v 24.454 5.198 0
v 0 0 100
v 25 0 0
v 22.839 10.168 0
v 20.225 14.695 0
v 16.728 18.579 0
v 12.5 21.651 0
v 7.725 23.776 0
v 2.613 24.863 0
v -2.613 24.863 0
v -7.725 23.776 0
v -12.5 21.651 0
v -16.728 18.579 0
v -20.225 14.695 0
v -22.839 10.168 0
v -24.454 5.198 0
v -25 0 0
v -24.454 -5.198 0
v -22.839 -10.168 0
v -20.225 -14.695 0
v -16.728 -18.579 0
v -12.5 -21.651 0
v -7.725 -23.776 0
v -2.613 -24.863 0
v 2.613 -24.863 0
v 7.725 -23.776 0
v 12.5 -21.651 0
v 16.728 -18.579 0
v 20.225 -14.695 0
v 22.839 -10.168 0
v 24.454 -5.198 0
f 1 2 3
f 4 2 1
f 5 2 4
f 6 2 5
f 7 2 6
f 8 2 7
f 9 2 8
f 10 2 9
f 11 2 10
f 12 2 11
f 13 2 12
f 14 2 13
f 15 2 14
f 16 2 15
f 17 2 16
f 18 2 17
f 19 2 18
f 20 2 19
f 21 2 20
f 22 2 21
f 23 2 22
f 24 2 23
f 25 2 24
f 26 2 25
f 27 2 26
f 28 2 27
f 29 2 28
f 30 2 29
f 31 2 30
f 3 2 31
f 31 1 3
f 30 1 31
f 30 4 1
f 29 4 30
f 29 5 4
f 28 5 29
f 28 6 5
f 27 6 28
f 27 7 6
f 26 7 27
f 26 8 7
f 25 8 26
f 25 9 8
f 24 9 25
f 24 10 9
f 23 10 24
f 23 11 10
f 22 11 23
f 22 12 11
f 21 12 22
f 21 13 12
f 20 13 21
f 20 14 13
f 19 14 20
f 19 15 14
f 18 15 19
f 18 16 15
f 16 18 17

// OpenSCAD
// Generated by SolidPython 1.1.3 on 2024-12-13 22:55:15


cylinder(h = 100, r1 = 25.0000000000, r2 = 0);
/***********************************************
*********      SolidPython code:      **********
************************************************
 
import cv2
import os
from solid import cube, cylinder, scad_render_to_file, polyhedron


# Function to detect shape
def detect_shape(view, view_name):
    if view is None:
        raise ValueError(f"{view_name} image could not be loaded. Check the file path.")

    gray_image = cv2.cvtColor(view, cv2.COLOR_BGR2GRAY)
    _, thresh_image = cv2.threshold(gray_image, 220, 255, cv2.THRESH_BINARY)
    contours, _ = cv2.findContours(thresh_image, cv2.RETR_TREE, cv2.CHAIN_APPROX_SIMPLE)

    for i, contour in enumerate(contours):
        if i == 0:
            continue  # Skip the outermost contour

        epsilon = 0.01 * cv2.arcLength(contour, True)
        approx = cv2.approxPolyDP(contour, epsilon, True)

        if len(approx) == 3:
            return "Triangle"
        elif len(approx) == 4:
            (x, y, w, h) = cv2.boundingRect(approx)
            aspect_ratio = w / float(h)
            if 0.95 <= aspect_ratio <= 1.05:
                return "Square"
            else:
                return "Rectangle"
        elif len(approx) == 5:
            return "Pentagon"
        elif len(approx) == 6:
            return "Hexagon"
        else:
            return "Circle"

    return "Unknown"


# Function to identify 3D shape
def identify_3d_shape(front_view, top_view, side_view):
    front_shape = detect_shape(front_view, "Front")
    top_shape = detect_shape(top_view, "Top")
    side_shape = detect_shape(side_view, "Side")

    if front_shape == "Square" and top_shape == "Square" and side_shape == "Square":
        return "Cube"
    elif front_shape == "Rectangle" and top_shape == "Circle" and side_shape == "Rectangle":
        return "Cylinder"
    elif front_shape == "Triangle" and top_shape == "Circle" and side_shape == "Triangle":
        return "Cone"
    elif front_shape == "Triangle" and top_shape == "Square" and side_shape == "Triangle":
        return "Pyramid"
    else:
        return "Shape not recognized"


# Function to create a 3D model
def create_3d_model(shape, dimensions, output_file):
    width, depth, height = dimensions
    if shape == "Cube":
        model = cube([width, depth, height])
    elif shape == "Cylinder":
        radius = width / 2.0
        model = cylinder(r=radius, h=height)
    elif shape == "Cone":
        radius = width / 2.0
        model = cylinder(r1=radius, r2=0, h=height)  # Cone: Circular base with apex
    elif shape == "Pyramid":
        model = polyhedron(
            points=[
                [0, 0, 0], [width, 0, 0], [width, depth, 0], [0, depth, 0],  # Base points
                [width / 2, depth / 2, height]  # Apex
            ],
            faces=[
                [0, 1, 4], [1, 2, 4], [2, 3, 4], [3, 0, 4],  # Sides
                [0, 1, 2, 3]  # Base
            ]
        )
    else:
        raise ValueError(f"Unsupported shape: {shape}")

    scad_render_to_file(model, output_file)
    print(f"3D model for {shape} saved as '{output_file}'.")


# Main function
if __name__ == "__main__":
    # File paths for the views
    front_path = r"C:\Users\Akshay\Downloads\3D_Shape_Generator\3D_Shape_Generator\images\conefrontview.png"
    top_path = r"C:\Users\Akshay\Downloads\3D_Shape_Generator\3D_Shape_Generator\images\conetopview.png"
    side_path = r"C:\Users\Akshay\Downloads\3D_Shape_Generator\3D_Shape_Generator\images\conesideview.png"

    # Load images
    front_view = cv2.imread(front_path)
    top_view = cv2.imread(top_path)
    side_view = cv2.imread(side_path)

    # Check for valid images
    if front_view is None or top_view is None or side_view is None:
        raise FileNotFoundError("One or more view images could not be loaded. Please check the file paths.")

    # Identify the 3D shape
    shape = identify_3d_shape(front_view, top_view, side_view)
    print(f"Detected 3D shape: {shape}")

    # Example dimensions (replace with actual dimensions)
    dimensions = (50, 50, 100)  # Width, Depth, Height

    # Create output folder
    output_folder = "output"
    os.makedirs(output_folder, exist_ok=True)

    # Generate and save the SCAD file
    if shape != "Shape not recognized":
        output_file = os.path.join(output_folder, f"{shape.lower()}_model.scad")
        create_3d_model(shape, dimensions, output_file)
    else:
        print("Unable to generate 3D model. Shape could not be recognized.")
 
 
************************************************/
